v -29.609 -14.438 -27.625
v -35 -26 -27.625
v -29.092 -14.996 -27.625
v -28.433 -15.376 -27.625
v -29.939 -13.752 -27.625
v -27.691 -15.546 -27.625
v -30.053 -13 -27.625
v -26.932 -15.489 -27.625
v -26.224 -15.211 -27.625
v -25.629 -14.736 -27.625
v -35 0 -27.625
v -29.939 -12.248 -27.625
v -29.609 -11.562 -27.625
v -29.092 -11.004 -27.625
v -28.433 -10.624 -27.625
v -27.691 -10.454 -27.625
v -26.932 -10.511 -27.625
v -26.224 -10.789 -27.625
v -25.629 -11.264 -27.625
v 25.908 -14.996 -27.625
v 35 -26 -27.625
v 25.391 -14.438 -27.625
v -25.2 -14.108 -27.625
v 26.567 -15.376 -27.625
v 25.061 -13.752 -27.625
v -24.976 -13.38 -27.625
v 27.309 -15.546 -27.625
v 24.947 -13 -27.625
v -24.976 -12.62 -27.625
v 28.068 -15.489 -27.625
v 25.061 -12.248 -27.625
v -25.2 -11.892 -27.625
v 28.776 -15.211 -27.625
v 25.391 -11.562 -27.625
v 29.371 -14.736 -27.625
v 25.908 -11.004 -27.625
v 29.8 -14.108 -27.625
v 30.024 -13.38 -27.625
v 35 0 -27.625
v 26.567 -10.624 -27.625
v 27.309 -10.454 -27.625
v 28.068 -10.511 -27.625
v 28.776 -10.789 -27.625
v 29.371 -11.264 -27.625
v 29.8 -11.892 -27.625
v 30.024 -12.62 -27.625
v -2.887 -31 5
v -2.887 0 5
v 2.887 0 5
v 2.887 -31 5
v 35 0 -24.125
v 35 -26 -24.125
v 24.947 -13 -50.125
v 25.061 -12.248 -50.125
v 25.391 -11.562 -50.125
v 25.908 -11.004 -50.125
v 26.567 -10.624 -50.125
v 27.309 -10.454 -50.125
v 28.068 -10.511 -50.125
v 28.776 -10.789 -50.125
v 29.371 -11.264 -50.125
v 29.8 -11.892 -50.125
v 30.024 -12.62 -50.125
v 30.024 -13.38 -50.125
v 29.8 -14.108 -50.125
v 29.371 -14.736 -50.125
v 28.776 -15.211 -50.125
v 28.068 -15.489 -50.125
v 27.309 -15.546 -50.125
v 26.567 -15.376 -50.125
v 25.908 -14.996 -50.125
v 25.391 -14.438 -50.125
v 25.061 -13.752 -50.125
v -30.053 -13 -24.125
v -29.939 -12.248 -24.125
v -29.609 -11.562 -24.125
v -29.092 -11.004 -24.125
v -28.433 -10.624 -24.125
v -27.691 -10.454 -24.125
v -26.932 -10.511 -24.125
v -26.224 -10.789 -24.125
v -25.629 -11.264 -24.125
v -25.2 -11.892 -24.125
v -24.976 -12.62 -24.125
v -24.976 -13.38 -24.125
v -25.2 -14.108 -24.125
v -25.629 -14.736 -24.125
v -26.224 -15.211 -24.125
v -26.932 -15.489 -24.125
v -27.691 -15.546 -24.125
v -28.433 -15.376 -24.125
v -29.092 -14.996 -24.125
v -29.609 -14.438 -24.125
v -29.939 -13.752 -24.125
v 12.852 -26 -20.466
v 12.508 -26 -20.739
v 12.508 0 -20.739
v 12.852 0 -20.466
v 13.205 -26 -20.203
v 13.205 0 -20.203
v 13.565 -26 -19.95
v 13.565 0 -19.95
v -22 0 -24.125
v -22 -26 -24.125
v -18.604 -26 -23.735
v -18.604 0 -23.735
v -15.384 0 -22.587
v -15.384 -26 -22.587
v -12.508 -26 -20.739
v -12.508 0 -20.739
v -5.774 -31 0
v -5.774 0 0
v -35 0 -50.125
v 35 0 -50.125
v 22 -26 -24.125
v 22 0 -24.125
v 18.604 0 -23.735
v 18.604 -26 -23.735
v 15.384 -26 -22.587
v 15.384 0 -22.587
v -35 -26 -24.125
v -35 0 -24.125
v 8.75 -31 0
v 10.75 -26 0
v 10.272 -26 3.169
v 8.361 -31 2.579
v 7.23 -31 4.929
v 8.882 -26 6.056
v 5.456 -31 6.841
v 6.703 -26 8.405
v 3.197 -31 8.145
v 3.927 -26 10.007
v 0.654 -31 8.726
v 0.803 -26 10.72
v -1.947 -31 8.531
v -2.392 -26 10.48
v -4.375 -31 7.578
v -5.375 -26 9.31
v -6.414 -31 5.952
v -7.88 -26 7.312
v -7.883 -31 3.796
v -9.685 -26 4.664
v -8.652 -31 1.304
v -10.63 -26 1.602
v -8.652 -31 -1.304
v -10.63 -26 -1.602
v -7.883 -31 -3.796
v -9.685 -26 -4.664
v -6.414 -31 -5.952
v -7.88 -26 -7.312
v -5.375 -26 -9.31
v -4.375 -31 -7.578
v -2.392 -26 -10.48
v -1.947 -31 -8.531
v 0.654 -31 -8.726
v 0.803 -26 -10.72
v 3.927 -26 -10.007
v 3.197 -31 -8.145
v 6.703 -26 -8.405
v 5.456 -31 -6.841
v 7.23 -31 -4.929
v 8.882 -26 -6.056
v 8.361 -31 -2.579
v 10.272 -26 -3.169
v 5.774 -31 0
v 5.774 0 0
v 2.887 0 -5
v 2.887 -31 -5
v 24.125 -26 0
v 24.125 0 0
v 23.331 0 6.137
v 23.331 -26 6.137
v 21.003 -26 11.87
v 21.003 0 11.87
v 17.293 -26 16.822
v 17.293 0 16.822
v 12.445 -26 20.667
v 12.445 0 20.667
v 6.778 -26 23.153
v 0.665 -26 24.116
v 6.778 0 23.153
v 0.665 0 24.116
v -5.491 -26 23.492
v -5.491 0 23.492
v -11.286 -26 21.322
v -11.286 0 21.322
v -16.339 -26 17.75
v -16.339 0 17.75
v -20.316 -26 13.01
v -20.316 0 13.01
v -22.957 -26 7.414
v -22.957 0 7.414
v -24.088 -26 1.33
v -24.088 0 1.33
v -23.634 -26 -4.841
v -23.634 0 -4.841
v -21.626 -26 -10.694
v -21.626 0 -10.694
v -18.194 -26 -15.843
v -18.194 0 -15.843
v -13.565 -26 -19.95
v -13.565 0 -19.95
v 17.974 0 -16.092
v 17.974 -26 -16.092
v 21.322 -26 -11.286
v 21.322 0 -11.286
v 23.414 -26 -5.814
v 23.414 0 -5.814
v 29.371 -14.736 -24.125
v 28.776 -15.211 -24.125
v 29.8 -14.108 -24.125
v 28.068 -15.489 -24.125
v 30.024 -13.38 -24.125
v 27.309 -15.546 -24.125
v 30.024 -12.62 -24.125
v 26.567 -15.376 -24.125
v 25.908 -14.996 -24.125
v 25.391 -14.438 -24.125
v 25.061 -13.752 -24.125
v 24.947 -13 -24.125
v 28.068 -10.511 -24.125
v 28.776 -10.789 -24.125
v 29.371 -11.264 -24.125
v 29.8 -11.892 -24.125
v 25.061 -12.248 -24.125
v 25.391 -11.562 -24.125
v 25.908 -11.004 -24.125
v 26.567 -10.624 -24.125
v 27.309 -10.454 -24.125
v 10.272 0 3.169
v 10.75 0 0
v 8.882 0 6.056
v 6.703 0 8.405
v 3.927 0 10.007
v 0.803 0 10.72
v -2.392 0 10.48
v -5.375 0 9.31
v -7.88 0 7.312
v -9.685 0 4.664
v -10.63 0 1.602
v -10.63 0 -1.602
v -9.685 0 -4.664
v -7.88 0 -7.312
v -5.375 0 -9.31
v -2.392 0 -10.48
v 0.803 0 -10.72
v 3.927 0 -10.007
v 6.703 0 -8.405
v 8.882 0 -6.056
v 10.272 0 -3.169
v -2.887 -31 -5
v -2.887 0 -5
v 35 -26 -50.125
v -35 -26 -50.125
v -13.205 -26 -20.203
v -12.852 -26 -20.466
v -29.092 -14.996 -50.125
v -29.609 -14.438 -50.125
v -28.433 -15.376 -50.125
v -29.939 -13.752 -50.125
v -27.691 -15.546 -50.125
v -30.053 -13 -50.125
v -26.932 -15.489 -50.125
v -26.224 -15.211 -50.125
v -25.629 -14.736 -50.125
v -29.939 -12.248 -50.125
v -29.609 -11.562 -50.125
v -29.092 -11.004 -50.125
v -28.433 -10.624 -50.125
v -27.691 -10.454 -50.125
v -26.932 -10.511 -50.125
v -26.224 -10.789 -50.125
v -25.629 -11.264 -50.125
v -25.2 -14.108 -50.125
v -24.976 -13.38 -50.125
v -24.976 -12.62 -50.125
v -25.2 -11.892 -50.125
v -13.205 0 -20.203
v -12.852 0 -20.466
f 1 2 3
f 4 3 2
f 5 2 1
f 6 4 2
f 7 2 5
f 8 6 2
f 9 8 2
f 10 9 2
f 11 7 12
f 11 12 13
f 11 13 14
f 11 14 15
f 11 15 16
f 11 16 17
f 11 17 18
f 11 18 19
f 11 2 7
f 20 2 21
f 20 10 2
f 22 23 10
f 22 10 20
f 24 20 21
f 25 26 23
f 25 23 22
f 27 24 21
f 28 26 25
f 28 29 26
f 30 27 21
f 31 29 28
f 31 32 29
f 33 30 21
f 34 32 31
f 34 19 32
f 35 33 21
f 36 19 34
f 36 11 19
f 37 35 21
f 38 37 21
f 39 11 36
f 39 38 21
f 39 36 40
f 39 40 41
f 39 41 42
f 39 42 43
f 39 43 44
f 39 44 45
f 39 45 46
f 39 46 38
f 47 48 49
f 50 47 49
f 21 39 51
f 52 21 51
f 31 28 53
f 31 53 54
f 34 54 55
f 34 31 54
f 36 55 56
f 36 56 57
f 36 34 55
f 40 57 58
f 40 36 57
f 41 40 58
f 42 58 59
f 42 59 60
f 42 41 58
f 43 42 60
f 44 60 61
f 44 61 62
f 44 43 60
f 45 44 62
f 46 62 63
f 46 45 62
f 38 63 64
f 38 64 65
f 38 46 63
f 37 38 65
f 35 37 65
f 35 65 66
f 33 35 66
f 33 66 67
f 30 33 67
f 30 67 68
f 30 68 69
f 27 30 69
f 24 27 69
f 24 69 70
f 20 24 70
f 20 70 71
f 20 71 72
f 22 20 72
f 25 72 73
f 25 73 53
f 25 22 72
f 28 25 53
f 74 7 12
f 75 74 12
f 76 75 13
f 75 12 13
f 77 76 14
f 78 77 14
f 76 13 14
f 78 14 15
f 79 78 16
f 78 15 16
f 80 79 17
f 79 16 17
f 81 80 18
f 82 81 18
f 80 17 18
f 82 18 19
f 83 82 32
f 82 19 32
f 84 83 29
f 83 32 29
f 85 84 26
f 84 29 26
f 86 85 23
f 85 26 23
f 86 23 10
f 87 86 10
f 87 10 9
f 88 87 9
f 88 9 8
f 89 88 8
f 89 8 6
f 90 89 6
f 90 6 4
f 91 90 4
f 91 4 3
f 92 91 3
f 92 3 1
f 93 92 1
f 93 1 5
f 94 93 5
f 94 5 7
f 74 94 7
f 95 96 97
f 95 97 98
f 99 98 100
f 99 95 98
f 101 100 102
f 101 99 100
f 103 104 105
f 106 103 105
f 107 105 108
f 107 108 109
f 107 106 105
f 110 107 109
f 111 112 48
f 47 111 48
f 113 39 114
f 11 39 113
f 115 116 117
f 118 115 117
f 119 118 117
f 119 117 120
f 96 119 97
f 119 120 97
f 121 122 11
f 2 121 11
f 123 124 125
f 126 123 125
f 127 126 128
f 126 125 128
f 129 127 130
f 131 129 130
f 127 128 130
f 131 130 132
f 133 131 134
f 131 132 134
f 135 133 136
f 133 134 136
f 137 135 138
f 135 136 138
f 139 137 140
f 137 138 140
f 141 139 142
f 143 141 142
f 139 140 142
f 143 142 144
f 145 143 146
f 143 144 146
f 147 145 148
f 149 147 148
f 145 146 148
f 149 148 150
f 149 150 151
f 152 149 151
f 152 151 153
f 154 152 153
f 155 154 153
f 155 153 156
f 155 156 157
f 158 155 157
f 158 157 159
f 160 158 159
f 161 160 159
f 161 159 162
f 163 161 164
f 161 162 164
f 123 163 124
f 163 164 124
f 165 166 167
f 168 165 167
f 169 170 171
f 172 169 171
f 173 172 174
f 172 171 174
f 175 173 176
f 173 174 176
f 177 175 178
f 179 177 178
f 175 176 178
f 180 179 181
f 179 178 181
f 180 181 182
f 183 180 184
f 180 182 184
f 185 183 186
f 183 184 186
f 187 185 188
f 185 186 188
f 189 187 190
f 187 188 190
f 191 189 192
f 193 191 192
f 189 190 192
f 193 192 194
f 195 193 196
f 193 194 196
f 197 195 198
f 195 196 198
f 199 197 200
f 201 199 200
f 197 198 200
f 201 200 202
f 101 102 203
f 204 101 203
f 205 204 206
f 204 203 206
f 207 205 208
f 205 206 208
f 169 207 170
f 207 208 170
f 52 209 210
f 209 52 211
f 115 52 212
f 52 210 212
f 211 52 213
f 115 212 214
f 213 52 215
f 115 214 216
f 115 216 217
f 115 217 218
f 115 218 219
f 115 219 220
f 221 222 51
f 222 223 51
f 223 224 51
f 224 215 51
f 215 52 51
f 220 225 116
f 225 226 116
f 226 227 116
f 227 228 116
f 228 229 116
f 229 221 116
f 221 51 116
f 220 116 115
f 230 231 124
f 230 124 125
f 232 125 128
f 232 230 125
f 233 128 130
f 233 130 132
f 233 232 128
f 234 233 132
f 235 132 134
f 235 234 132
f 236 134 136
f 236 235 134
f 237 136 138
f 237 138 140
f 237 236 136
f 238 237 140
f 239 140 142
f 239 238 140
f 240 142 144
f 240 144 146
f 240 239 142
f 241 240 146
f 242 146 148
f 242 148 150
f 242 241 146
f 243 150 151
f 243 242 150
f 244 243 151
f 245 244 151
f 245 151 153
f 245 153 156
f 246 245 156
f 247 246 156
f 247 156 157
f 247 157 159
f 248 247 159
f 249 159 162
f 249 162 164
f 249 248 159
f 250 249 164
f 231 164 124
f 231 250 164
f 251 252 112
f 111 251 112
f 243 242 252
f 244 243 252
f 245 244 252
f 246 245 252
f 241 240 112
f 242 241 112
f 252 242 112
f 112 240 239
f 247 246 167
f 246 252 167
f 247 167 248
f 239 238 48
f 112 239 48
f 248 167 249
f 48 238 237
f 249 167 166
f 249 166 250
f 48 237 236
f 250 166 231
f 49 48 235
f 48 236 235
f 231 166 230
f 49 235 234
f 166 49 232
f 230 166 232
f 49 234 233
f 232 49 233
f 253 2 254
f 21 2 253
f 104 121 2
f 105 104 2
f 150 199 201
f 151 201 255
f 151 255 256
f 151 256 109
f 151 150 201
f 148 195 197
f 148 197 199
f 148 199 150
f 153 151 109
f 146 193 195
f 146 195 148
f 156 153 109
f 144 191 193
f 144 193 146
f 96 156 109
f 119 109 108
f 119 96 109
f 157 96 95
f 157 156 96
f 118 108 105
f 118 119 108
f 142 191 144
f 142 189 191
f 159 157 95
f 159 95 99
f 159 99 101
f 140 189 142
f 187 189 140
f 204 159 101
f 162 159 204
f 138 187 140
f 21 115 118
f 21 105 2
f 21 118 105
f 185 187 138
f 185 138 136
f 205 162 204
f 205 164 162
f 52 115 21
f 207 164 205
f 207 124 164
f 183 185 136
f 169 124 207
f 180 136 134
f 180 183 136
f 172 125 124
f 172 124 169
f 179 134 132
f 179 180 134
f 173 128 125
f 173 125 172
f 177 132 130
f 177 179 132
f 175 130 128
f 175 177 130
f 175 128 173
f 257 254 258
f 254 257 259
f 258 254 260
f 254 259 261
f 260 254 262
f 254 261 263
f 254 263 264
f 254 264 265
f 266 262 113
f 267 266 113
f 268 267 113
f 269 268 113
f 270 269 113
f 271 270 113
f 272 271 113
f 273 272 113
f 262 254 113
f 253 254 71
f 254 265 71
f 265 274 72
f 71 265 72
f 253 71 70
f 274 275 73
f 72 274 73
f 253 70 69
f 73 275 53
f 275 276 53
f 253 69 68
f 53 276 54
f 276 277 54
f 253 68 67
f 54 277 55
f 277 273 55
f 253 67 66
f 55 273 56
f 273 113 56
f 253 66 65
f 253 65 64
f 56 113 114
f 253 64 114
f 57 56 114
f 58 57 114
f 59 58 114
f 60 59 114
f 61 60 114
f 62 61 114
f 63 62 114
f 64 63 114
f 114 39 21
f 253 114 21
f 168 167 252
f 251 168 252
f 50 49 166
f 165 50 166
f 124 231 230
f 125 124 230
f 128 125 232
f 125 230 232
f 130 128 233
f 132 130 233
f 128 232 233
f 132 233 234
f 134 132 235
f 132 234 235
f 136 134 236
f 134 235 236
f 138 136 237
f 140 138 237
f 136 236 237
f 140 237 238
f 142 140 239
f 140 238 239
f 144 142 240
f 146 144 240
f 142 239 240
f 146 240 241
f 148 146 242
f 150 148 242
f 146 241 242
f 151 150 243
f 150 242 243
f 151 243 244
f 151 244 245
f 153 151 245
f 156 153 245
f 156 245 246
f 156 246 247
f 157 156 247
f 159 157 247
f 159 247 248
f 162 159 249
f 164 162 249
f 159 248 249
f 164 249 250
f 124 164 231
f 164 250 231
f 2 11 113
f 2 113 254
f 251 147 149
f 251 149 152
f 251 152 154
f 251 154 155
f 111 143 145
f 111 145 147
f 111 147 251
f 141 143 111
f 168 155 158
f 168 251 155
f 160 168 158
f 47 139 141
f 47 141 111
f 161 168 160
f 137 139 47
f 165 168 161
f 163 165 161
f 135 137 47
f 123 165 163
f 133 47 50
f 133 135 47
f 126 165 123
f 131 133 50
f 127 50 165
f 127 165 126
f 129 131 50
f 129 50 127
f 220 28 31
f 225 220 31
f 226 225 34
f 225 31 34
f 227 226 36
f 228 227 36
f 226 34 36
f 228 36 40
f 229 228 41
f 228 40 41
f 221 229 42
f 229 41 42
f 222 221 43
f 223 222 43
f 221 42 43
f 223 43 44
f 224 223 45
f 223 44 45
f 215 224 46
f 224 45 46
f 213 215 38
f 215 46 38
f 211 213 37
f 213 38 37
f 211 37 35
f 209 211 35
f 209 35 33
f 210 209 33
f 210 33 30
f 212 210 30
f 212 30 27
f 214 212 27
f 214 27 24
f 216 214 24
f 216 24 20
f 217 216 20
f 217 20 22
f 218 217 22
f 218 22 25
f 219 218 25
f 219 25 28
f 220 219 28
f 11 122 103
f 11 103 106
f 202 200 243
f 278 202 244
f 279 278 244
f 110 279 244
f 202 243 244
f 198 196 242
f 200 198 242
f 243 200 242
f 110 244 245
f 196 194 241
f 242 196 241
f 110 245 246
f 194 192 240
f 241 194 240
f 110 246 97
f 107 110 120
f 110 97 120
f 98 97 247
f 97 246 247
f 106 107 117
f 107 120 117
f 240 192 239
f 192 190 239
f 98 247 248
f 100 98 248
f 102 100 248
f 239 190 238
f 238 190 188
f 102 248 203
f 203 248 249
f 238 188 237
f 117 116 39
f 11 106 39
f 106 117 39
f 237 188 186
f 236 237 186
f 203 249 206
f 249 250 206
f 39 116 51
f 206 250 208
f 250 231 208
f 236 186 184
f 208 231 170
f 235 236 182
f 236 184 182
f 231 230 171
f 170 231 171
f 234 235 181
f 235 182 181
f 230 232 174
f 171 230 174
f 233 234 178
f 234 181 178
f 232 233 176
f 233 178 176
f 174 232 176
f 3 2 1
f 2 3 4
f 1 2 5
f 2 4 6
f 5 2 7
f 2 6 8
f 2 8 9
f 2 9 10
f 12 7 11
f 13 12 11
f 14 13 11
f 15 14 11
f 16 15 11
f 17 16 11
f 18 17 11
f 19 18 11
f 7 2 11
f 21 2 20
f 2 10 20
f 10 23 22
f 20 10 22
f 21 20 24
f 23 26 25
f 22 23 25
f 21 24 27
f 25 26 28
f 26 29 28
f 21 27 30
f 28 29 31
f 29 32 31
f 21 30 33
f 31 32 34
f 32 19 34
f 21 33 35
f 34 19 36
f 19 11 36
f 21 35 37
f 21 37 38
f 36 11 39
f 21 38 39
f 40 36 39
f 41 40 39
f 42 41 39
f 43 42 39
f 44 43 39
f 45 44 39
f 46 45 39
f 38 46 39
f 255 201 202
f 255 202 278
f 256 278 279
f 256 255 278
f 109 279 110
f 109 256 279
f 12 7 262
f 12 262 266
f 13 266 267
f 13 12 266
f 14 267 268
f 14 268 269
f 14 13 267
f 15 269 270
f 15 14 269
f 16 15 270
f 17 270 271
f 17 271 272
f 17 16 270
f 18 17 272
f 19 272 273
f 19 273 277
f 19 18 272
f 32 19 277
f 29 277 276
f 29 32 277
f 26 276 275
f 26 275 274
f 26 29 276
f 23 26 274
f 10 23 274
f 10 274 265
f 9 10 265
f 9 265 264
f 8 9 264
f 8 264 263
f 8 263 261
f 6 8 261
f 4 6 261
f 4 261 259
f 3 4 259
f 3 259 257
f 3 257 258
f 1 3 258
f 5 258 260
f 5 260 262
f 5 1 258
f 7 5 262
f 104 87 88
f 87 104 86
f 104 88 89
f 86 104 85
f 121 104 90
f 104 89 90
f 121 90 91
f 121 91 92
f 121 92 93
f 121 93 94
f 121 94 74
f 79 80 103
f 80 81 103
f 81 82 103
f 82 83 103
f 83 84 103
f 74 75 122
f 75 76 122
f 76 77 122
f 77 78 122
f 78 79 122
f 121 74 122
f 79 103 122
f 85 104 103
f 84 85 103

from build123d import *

# Parameters (mm, degrees)
F0_R         = 10.75
F1_DEPTH     = 26
F2_W         = 14
F2_H         = 26
F3_DEPTH     = 2
F4_T1_DEPTH  = 26
F4_T6_DEPTH  = 26
F4_T11_DEPTH = 26
F5_DEPTH     = 31
F6_SIZE2     = 5
F6_SIZE      = 2
F7_D         = 5.1054
F8_DEPTH     = 22.5


# Not quite as in the source:
# - a fillet or chamfer that OpenCascade refuses, or shapes differently, is made with other operations: its cross-section is extruded or revolved along the edge and cut away or added


with BuildPart() as f1:
    # F0 (on Front) → F1 (new body)
    with BuildSketch(Plane.XZ):
        with BuildLine():
            ThreePointArc((4.14e-08, -24.125), (17.0589511108, -17.0589510815), (24.125, 0))
            ThreePointArc((24.125, 0), (-17.0589511108, 17.0589510815), (4.14e-08, -24.125))
        make_face()
        Circle(F0_R, mode=Mode.SUBTRACT)
    extrude(amount=F1_DEPTH)



with BuildPart() as f1b:
    # F0 (on Front) → F1, piece 2 (new body)
    with BuildSketch(Plane.XZ):
        Polygon((35, -24.125), (4.14e-08, -24.125), (-35, -24.125), (-35, -27.625), (35, -27.625), align=None)
    extrude(amount=F1_DEPTH)


with BuildPart() as f1_1:
    add(f1.part)

    add(f1b.part)  # F3 merges F1b
    # F2 (on face) → F3 (join)
    with BuildSketch(Plane.XY.offset(-24.125)):
        with Locations((0, -13)):
            Rectangle(F2_W, F2_H)
    extrude(amount=F3_DEPTH)

    # F4: fillet of radius 15 on 4 edges, made by hand

    # F4_s2 → F4_t1 (join)
    with BuildSketch(Plane.XZ):
        with BuildLine():
            ThreePointArc((-22, -24.125), (-11.3933982822, -19.7316017178), (-7, -9.125))
            Line((-7, -9.125), (-7, -24.125))
            Line((-7, -24.125), (-22, -24.125))
        make_face()
        with BuildLine():
            ThreePointArc((22, -24.125), (11.3933982822, -19.7316017178), (7, -9.125))
            Line((7, -9.125), (7, -24.125))
            Line((7, -24.125), (22, -24.125))
        make_face()
    extrude(amount=F4_T1_DEPTH)


with BuildPart() as f4_tool4:
    # F4_s5 → F4_t6 (new body)
    with BuildSketch(Plane.XZ.offset(26)):
        with BuildLine():
            ThreePointArc((7, -32.3537575098), (8.7425950525, -25.3365490863), (13.5654952077, -19.9497610204))
            ThreePointArc((13.5654952077, -19.9497610204), (10.4017148166, -21.7674057681), (7, -23.0871311557))
            Line((7, -23.0871311557), (7, -32.3537575098))
        make_face()
    extrude(amount=-F4_T6_DEPTH)

    split(bisect_by=Plane.XY.offset(-27.625), keep=Keep.TOP)


with BuildPart() as f1_2:
    add(f1_1.part)

    # F4_t3: union F4_tool4
    add(f4_tool4.part)


with BuildPart() as f4_tool9:
    # F4_s10 → F4_t11 (new body)
    with BuildSketch(Plane.XZ.offset(26)):
        with BuildLine():
            ThreePointArc((-13.5654952077, -19.9497610204), (-8.7425950525, -25.3365490863), (-7, -32.3537575098))
            Line((-7, -32.3537575098), (-7, -23.0871311557))
            ThreePointArc((-7, -23.0871311557), (-10.4017148166, -21.7674057681), (-13.5654952077, -19.9497610204))
        make_face()
    extrude(amount=-F4_T11_DEPTH)

    split(bisect_by=Plane.XY.offset(-27.625), keep=Keep.TOP)


with BuildPart() as f1_3:
    add(f1_2.part)

    # F4_t8: union F4_tool9
    add(f4_tool9.part)

    # F7 (through all)
    with Locations(Plane.XY.offset(-24.125)):
        with Locations((-27.5, -13), (27.5, -13)):
            Hole(F7_D / 2)


with BuildPart() as f5:
    # F0 (on Front) → F5 (new body)
    with BuildSketch(Plane.XZ):
        Circle(F0_R)
        Polygon((-5.7735026919, 0), (-2.8867513459, 5), (2.8867513459, 5), (5.7735026919, 0), (2.8867513459, -5), (-2.8867513459, -5), align=None, mode=Mode.SUBTRACT)
    extrude(amount=F5_DEPTH)

    # F6
    f6_edges = [f5.edges().sort_by_distance(p)[0] for p in [
        (-10.75, -31, 0),
    ]]
    f6_side = f5.faces().sort_by_distance((-10.445944, -31, 0))[0]
    chamfer(f6_edges, length=F6_SIZE, length2=F6_SIZE2, reference=f6_side)


with BuildPart() as f8:
    # F8 (new): a face of the model
    f8_faces = [f1_3.part.faces().sort_by_distance(p)[0] for p in [
        (0, -13, -27.625),
    ]]
    extrude(f8_faces, amount=F8_DEPTH)


solid = Compound([f1_3.part, f5.part, f8.part])
